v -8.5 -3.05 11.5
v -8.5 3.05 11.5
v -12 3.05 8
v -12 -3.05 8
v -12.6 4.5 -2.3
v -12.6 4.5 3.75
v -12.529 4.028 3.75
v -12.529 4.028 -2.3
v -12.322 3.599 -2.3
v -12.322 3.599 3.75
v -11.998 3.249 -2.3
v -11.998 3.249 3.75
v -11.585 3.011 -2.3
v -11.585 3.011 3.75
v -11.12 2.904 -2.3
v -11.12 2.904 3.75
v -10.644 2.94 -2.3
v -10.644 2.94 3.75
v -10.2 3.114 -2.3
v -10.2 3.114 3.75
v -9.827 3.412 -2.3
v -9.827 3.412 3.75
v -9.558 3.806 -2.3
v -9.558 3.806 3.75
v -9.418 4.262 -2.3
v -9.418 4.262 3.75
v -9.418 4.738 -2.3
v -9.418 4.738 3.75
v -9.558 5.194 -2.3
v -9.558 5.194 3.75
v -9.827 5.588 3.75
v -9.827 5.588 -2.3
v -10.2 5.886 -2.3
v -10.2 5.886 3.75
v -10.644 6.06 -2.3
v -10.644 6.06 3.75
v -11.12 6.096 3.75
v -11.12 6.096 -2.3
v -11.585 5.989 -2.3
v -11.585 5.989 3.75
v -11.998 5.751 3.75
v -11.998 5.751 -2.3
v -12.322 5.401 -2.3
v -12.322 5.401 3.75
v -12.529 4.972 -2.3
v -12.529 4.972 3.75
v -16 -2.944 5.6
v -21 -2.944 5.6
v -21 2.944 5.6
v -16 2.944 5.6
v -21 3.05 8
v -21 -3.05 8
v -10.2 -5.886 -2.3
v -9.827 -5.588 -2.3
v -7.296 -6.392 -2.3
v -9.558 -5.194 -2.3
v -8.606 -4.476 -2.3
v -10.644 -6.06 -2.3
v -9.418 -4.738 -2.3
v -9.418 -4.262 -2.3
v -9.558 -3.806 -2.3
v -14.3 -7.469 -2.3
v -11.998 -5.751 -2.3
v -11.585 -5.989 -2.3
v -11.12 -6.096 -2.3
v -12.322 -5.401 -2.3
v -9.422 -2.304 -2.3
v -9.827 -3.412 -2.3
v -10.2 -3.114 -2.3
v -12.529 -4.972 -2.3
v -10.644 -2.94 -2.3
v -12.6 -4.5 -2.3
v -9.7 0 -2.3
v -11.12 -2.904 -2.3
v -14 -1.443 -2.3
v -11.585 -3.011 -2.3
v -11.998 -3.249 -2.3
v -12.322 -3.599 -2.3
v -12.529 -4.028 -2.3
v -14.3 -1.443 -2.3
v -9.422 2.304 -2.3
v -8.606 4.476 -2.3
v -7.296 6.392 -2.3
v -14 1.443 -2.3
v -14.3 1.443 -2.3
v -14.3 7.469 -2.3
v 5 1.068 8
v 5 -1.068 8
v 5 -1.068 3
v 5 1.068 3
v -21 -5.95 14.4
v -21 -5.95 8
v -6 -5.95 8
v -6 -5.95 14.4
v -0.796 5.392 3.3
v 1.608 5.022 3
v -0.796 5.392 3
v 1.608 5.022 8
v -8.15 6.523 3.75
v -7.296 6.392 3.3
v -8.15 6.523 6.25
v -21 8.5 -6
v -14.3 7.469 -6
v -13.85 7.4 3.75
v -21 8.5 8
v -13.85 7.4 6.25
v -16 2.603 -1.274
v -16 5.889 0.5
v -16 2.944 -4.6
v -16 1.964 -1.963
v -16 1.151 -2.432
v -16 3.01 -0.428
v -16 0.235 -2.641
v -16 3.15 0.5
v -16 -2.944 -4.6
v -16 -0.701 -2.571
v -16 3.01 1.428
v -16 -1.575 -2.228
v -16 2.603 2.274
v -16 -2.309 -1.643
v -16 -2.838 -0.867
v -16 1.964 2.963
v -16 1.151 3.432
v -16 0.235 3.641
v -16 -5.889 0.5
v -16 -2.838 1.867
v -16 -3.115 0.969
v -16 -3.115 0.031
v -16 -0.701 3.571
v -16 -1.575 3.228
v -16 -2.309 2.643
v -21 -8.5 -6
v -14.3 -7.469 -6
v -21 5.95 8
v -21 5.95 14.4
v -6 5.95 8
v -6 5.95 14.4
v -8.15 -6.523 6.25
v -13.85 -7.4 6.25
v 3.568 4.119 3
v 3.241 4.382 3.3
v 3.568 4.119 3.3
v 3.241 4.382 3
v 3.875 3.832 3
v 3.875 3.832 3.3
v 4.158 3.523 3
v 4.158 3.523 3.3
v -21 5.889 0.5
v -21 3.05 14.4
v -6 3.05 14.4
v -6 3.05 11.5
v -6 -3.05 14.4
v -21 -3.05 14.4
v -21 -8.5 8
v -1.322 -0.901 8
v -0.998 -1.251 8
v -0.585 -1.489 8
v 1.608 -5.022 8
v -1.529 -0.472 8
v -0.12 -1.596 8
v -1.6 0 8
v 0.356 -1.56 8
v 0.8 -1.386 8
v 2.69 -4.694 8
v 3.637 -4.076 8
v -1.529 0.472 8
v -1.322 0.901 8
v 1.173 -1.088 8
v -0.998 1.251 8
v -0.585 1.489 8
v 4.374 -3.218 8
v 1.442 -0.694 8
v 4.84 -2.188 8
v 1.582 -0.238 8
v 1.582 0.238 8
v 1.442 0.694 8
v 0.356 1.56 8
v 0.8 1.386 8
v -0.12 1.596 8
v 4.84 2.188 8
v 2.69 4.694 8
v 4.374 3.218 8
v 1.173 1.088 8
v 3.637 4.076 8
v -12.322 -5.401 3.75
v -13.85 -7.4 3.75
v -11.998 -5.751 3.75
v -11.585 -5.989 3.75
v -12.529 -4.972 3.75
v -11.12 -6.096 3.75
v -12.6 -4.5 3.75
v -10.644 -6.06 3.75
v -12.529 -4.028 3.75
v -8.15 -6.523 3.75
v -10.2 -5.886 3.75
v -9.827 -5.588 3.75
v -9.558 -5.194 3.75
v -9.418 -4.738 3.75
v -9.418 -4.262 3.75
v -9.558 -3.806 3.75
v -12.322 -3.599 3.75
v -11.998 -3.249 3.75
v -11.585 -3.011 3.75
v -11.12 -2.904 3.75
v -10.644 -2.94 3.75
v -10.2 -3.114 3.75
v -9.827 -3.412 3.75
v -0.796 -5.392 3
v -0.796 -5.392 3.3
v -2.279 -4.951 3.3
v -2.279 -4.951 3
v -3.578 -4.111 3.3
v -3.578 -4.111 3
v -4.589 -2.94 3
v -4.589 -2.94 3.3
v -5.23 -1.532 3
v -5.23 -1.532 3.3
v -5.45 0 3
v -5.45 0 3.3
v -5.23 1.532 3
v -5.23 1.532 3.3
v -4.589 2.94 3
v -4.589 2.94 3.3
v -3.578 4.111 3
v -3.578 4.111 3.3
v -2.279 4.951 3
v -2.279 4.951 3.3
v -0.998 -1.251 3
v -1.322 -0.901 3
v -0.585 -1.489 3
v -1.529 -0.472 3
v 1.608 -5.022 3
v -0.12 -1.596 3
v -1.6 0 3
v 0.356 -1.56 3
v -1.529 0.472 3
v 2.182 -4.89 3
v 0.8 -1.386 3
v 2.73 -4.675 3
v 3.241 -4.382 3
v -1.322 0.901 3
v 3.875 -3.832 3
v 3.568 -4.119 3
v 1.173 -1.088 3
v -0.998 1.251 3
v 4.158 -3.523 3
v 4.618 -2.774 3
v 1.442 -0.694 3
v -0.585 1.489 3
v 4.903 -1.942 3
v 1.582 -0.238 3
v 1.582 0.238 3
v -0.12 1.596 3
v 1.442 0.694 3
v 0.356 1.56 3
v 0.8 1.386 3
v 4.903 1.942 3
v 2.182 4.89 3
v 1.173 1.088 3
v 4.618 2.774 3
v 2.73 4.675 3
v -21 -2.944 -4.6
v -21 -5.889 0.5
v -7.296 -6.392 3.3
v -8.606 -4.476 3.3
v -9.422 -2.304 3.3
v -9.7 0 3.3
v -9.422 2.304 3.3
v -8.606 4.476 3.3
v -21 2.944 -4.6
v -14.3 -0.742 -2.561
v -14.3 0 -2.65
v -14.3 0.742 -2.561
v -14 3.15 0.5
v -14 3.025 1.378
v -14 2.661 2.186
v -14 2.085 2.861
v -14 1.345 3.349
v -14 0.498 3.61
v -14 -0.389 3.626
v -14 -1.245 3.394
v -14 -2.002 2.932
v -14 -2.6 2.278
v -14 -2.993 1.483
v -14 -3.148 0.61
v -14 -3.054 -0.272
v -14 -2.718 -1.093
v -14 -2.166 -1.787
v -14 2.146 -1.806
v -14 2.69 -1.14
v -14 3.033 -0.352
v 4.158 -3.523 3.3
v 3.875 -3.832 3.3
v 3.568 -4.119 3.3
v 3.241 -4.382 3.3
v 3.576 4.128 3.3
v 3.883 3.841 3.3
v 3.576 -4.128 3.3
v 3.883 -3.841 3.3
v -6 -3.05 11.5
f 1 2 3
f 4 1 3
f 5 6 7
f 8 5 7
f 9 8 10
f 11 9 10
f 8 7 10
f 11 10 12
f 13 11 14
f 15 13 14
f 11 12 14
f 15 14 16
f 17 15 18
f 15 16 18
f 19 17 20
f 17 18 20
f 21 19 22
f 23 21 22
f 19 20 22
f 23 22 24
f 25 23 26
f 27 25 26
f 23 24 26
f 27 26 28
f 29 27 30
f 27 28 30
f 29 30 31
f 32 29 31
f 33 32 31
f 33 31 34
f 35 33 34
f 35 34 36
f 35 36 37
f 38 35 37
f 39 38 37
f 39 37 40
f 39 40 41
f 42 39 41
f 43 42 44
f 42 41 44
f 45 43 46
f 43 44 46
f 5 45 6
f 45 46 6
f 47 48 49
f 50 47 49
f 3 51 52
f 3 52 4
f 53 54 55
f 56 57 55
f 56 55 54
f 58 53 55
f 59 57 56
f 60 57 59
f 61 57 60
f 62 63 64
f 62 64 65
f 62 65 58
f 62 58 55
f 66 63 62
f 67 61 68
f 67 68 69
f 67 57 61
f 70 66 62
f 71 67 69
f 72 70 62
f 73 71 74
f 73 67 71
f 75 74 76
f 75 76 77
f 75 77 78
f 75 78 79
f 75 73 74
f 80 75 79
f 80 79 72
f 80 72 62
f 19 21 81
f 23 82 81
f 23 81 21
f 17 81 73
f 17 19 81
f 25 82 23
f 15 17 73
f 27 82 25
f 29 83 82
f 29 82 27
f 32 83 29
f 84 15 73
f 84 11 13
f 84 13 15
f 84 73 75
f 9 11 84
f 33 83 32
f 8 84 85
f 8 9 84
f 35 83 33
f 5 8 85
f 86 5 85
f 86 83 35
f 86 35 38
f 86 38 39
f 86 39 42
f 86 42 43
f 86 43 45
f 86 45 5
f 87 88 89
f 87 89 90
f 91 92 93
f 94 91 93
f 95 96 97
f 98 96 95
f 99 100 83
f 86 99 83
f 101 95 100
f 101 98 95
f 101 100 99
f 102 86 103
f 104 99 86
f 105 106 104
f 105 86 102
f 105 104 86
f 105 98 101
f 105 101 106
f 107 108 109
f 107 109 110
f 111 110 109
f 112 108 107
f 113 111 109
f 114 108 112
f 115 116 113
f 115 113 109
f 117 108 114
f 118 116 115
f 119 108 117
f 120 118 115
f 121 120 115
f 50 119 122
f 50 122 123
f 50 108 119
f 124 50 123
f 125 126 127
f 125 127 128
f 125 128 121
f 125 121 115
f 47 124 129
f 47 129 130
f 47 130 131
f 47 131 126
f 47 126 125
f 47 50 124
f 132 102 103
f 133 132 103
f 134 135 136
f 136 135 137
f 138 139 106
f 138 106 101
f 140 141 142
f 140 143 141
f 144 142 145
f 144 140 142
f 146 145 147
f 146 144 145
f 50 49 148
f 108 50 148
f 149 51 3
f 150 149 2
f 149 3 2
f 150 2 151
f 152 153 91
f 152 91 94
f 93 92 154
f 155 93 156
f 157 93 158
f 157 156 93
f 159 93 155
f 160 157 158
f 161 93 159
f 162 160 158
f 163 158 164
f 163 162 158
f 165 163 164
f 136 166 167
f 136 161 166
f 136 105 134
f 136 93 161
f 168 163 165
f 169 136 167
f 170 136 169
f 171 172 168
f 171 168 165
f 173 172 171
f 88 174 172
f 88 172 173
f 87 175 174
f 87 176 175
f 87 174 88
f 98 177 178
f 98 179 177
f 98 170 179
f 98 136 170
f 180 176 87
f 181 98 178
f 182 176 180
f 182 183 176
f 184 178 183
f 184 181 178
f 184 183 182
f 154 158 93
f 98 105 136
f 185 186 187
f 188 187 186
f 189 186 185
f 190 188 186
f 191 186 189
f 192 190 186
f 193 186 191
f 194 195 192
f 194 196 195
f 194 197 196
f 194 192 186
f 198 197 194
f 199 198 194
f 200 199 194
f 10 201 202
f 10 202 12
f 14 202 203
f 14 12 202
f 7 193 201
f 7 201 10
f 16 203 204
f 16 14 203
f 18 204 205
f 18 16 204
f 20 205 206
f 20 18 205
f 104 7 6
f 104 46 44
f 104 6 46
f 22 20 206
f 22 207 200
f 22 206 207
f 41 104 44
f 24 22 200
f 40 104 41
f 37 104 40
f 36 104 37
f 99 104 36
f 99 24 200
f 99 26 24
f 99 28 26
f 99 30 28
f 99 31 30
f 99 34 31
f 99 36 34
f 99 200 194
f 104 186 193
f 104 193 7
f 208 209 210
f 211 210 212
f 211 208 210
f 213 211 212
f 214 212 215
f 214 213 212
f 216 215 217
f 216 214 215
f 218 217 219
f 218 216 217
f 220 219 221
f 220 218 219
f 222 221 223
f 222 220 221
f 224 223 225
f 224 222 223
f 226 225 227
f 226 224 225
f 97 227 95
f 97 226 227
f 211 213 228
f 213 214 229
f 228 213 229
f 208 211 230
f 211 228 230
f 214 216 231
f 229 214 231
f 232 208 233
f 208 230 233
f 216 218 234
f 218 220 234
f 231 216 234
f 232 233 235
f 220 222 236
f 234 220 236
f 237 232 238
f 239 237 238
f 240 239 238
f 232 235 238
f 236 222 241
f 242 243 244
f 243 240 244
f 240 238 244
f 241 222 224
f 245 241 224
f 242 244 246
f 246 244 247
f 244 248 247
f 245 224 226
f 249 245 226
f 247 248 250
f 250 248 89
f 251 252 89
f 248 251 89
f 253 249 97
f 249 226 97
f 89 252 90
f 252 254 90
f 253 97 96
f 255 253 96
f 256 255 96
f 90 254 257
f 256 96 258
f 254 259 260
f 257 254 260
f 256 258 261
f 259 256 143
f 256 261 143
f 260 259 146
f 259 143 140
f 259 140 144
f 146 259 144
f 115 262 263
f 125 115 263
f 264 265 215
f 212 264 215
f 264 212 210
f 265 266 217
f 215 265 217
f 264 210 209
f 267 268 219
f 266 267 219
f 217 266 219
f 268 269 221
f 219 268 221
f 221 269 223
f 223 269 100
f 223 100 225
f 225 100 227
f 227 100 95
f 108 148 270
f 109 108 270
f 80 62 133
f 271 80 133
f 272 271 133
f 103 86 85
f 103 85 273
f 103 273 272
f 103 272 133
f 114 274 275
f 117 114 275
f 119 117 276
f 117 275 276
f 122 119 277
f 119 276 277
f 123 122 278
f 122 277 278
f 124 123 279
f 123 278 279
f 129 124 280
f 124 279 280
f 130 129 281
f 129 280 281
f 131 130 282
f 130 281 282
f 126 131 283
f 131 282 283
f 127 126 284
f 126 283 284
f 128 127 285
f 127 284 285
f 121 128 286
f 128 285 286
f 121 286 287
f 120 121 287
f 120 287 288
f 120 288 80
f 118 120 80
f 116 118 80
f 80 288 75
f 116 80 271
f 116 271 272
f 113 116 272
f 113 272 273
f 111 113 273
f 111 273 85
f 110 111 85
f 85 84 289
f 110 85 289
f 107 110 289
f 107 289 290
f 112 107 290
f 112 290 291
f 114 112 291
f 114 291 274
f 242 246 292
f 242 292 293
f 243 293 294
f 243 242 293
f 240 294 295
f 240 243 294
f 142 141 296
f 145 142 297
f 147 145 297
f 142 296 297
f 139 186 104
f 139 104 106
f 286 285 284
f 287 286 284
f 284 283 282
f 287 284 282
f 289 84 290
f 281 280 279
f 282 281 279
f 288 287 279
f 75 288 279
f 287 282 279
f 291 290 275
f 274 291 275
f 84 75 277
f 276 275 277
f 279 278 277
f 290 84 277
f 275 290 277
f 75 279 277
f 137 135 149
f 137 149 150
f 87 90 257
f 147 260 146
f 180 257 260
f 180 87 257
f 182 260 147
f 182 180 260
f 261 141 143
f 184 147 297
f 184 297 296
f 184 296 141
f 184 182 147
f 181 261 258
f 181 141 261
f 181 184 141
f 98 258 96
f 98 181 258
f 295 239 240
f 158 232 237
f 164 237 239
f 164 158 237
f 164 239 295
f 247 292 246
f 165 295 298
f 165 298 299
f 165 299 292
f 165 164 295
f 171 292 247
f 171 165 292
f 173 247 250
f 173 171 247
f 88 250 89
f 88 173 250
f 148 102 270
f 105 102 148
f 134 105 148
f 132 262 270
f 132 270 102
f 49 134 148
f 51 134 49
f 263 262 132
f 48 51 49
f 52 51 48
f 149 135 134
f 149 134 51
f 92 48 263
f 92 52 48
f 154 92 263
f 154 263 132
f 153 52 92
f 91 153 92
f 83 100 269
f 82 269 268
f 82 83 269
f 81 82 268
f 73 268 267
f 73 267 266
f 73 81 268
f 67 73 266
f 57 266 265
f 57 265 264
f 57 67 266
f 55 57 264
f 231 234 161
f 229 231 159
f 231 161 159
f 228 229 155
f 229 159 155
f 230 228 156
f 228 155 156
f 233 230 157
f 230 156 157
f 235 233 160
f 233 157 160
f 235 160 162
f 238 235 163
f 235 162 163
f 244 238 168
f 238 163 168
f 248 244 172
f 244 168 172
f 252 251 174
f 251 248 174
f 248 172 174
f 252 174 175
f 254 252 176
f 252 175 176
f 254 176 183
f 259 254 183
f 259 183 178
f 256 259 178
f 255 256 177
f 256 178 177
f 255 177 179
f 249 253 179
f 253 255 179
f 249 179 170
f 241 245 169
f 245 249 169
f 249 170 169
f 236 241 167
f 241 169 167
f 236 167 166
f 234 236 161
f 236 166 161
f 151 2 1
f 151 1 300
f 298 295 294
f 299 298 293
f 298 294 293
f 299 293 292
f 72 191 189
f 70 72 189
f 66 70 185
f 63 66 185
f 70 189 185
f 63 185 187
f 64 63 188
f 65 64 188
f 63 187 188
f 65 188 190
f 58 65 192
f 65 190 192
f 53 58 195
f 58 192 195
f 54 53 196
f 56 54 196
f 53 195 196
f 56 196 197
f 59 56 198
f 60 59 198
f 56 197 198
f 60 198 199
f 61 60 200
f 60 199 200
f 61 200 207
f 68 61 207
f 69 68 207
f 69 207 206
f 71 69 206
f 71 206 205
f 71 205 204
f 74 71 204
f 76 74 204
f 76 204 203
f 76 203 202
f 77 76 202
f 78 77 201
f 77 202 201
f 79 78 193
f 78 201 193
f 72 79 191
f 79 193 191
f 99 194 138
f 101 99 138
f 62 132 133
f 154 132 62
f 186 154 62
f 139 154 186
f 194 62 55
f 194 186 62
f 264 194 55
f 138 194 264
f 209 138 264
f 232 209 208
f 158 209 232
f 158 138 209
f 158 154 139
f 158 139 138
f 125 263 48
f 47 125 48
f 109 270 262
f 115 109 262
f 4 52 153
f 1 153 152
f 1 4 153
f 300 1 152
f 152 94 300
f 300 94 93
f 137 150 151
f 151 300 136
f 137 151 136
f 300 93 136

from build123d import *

# Parameters (mm, degrees)
F1_DEPTH        = 8
F1_DEPTH_BACK   = 6
F2_R            = 8.3
F2_R_2          = 2.95
F3_DEPTH        = 3
F3_DEPTH_BACK   = 3
F5_DEPTH        = 3.3
F5_DEPTH_BACK   = 3.3
F7_START        = -14
F6_R            = 3.15
F7_DEPTH        = 26
F9_DEPTH        = 5
F10_W           = 15
F10_H           = 2.9
F11_DEPTH       = 6.4
F12_W           = 1
F12_H           = 6.5
F13_DEPTH       = 3.5
F14_T4_DEPTH    = 31.8168298797
F16_D           = 3.2
F16_DEPTH       = 11
F16_CBORE_D     = 6.5
F16_CBORE_DEPTH = 2.5
F16_TIP         = 0.9613769904
F18_D           = 3.2
F18_CBORE_D     = 6.2
F18_CBORE_DEPTH = 2.6
F20_DEPTH       = 25
F20_DEPTH_BACK  = 25
F21_W           = 5.7
F21_H           = 2.5
F22_DEPTH       = 25
F22_DEPTH_BACK  = 25


# Not quite as in the source:
# - a fillet or chamfer that OpenCascade refuses, or shapes differently, is made with other operations: its cross-section is extruded or revolved along the edge and cut away or added


with BuildPart() as f1:
    # F0 (on Top) → F1 (new body, two sides)
    with BuildSketch(Plane.XY) as f1_sk:
        with BuildLine():
            Line((-21, -8.5), (1.608228737, -5.0218109635))
            ThreePointArc((1.608228737, -5.0218109635), (4.0358618997, -3.6728476468), (5, -1.0683241729))
            Line((5, -1.0683241729), (5, 1.0683241729))
            ThreePointArc((5, 1.0683241729), (4.0358618997, 3.6728476468), (1.608228737, 5.0218109635))
            Line((1.608228737, 5.0218109635), (-21, 8.5))
            Line((-21, 8.5), (-21, -8.5))
        make_face()
    extrude(amount=F1_DEPTH)
    extrude(f1_sk.sketch, amount=-F1_DEPTH_BACK)

    # F2 (on Top) → F3 (cut, two sides)
    with BuildSketch(Plane.XY) as f3_sk:
        Circle(F2_R)
        Circle(F2_R_2, mode=Mode.SUBTRACT)
    extrude(amount=-F3_DEPTH, mode=Mode.SUBTRACT)
    extrude(f3_sk.sketch, amount=F3_DEPTH_BACK, mode=Mode.SUBTRACT)

    # F4 (on Top) → F5 (cut, two sides)
    with BuildSketch(Plane.XY) as f5_sk:
        with BuildLine():
            ThreePointArc((5, -2.1685248442), (-5.45, 0), (5, 2.1685248442))
            Line((5, 2.1685248442), (5, 8.3120394609))
            ThreePointArc((5, 8.3120394609), (-9.7, 0), (5, -8.3120394609))
            Line((5, -8.3120394609), (5, -2.1685248442))
        make_face()
    extrude(amount=F5_DEPTH, mode=Mode.SUBTRACT)
    extrude(f5_sk.sketch, amount=-F5_DEPTH_BACK, mode=Mode.SUBTRACT)

    # F6 (on Right) → F7 (cut)
    with BuildSketch(Plane.YZ.offset(F7_START)):
        with Locations((0, 0.5)):
            Circle(F6_R)
    extrude(amount=-F7_DEPTH, mode=Mode.SUBTRACT)

    # F8 (on face) → F9 (cut)
    with BuildSketch(Plane(origin=(-21, 0, 0), x_dir=(0, -1, 0), z_dir=(-1, 0, 0))):
        Polygon((2.9444863729, 5.6), (-2.9444863729, 5.6), (-5.8889727457, 0.5), (-2.9444863729, -4.6), (2.9444863729, -4.6), (5.8889727457, 0.5), align=None)
    extrude(amount=-F9_DEPTH, mode=Mode.SUBTRACT)

    # F10 (on face) → F11 (join)
    with BuildSketch(Plane.XY.offset(8)):
        with Locations((-13.5, 4.5)):
            Rectangle(F10_W, F10_H)
        with Locations((-13.5, -4.5)):
            Rectangle(F10_W, F10_H)
    extrude(amount=F11_DEPTH)

    # F12 (on face) → F13 (join)
    with BuildSketch(Plane.XY.offset(8)):
        with Locations((-6.5, 0)):
            Rectangle(F12_W, F12_H)
    extrude(amount=F13_DEPTH)

    # F14: chamfer of 5 on 1 edges, made by hand


with BuildPart() as f14_tool2:
    # F14_s3 → F14_t4 (new body)
    with BuildSketch(Plane.XZ.offset(-15.9084149398)):
        Polygon((-7, 13), (-12, 8), (-7, 8), align=None)
    extrude(amount=F14_T4_DEPTH)

    split(bisect_by=Plane.XY.offset(11.5), keep=Keep.BOTTOM)

    split(bisect_by=Plane.XZ.offset(-5.95), keep=Keep.TOP)

    split(bisect_by=Plane.XZ.offset(5.95), keep=Keep.BOTTOM)


with BuildPart() as f1_1:
    add(f1.part)

    # F14_t1: union F14_tool2
    add(f14_tool2.part)

    # F16
    with Locations(Plane(origin=(0, 0, -6), x_dir=(1, 0, 0), z_dir=(0, 0, -1))):
        with Locations((-11, -4.5), (-11, 4.5)):
            CounterBoreHole(F16_D / 2, F16_CBORE_D / 2, F16_CBORE_DEPTH, depth=F16_DEPTH)
            with Locations((0, 0, -(F16_DEPTH + F16_TIP / 2))):  # 118° drill point
                Cone(0, F16_D / 2, F16_TIP, mode=Mode.SUBTRACT)

    # F18 (through all)
    with Locations(Plane(origin=(0, 0, -6), x_dir=(1, 0, 0), z_dir=(0, 0, -1))):
        with Locations((0, 0)):
            CounterBoreHole(F18_D / 2, F18_CBORE_D / 2, F18_CBORE_DEPTH)

    # F19 (on Front) → F20 (cut, two sides)
    with BuildSketch(Plane.XZ) as f20_sk:
        Polygon((9.8263500258, -7.5822613659), (9.9938229204, 3), (-6.1094067059, 3), (-6.1094067059, -2.3), (-14.3, -2.3), (-14.3, -7.5822613659), align=None)
    extrude(amount=-F20_DEPTH, mode=Mode.SUBTRACT)
    extrude(f20_sk.sketch, amount=F20_DEPTH_BACK, mode=Mode.SUBTRACT)

    # F21 (on Front) → F22 (cut, two sides)
    with BuildSketch(Plane.XZ) as f22_sk:
        with Locations((-11, 5)):
            Rectangle(F21_W, F21_H)
    extrude(amount=-F22_DEPTH, mode=Mode.SUBTRACT)
    extrude(f22_sk.sketch, amount=F22_DEPTH_BACK, mode=Mode.SUBTRACT)


solid = f1_1.part
